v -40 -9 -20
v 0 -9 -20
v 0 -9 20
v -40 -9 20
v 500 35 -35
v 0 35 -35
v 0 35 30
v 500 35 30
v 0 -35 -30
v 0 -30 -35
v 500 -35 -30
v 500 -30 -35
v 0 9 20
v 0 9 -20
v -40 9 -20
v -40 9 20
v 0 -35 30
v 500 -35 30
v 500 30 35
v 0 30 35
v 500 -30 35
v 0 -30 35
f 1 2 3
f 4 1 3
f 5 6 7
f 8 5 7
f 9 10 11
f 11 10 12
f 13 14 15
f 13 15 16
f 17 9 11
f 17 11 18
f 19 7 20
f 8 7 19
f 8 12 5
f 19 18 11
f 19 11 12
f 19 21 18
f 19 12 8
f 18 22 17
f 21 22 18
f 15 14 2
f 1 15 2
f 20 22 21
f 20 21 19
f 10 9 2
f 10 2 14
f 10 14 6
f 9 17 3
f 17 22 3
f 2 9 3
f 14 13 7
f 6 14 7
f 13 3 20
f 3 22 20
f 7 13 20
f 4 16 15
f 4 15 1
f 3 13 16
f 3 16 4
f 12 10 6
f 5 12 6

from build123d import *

# Parameters (mm, degrees)
F0_W     = 70
F0_H     = 70
F1_DEPTH = 500
F2_W     = 18
F2_H     = 40
F3_DEPTH = 40
F4_SIZE  = 5


with BuildPart() as f1:
    # F0 (on Right) → F1 (new body)
    with BuildSketch(Plane.YZ):
        Rectangle(F0_W, F0_H)
    extrude(amount=F1_DEPTH)

    # F2 (on face) → F3 (join)
    with BuildSketch(Plane(origin=(0, 0, 0), x_dir=(0, -1, 0), z_dir=(-1, 0, 0))):
        Rectangle(F2_W, F2_H)
    extrude(amount=F3_DEPTH)

    # F4
    f4_edges = [f1.edges().sort_by_distance(p)[0] for p in [
        (250, -35, 35),
        (250, 35, 35),
        (250, -35, -35),
    ]]
    chamfer(f4_edges, length=F4_SIZE)


solid = f1.part
